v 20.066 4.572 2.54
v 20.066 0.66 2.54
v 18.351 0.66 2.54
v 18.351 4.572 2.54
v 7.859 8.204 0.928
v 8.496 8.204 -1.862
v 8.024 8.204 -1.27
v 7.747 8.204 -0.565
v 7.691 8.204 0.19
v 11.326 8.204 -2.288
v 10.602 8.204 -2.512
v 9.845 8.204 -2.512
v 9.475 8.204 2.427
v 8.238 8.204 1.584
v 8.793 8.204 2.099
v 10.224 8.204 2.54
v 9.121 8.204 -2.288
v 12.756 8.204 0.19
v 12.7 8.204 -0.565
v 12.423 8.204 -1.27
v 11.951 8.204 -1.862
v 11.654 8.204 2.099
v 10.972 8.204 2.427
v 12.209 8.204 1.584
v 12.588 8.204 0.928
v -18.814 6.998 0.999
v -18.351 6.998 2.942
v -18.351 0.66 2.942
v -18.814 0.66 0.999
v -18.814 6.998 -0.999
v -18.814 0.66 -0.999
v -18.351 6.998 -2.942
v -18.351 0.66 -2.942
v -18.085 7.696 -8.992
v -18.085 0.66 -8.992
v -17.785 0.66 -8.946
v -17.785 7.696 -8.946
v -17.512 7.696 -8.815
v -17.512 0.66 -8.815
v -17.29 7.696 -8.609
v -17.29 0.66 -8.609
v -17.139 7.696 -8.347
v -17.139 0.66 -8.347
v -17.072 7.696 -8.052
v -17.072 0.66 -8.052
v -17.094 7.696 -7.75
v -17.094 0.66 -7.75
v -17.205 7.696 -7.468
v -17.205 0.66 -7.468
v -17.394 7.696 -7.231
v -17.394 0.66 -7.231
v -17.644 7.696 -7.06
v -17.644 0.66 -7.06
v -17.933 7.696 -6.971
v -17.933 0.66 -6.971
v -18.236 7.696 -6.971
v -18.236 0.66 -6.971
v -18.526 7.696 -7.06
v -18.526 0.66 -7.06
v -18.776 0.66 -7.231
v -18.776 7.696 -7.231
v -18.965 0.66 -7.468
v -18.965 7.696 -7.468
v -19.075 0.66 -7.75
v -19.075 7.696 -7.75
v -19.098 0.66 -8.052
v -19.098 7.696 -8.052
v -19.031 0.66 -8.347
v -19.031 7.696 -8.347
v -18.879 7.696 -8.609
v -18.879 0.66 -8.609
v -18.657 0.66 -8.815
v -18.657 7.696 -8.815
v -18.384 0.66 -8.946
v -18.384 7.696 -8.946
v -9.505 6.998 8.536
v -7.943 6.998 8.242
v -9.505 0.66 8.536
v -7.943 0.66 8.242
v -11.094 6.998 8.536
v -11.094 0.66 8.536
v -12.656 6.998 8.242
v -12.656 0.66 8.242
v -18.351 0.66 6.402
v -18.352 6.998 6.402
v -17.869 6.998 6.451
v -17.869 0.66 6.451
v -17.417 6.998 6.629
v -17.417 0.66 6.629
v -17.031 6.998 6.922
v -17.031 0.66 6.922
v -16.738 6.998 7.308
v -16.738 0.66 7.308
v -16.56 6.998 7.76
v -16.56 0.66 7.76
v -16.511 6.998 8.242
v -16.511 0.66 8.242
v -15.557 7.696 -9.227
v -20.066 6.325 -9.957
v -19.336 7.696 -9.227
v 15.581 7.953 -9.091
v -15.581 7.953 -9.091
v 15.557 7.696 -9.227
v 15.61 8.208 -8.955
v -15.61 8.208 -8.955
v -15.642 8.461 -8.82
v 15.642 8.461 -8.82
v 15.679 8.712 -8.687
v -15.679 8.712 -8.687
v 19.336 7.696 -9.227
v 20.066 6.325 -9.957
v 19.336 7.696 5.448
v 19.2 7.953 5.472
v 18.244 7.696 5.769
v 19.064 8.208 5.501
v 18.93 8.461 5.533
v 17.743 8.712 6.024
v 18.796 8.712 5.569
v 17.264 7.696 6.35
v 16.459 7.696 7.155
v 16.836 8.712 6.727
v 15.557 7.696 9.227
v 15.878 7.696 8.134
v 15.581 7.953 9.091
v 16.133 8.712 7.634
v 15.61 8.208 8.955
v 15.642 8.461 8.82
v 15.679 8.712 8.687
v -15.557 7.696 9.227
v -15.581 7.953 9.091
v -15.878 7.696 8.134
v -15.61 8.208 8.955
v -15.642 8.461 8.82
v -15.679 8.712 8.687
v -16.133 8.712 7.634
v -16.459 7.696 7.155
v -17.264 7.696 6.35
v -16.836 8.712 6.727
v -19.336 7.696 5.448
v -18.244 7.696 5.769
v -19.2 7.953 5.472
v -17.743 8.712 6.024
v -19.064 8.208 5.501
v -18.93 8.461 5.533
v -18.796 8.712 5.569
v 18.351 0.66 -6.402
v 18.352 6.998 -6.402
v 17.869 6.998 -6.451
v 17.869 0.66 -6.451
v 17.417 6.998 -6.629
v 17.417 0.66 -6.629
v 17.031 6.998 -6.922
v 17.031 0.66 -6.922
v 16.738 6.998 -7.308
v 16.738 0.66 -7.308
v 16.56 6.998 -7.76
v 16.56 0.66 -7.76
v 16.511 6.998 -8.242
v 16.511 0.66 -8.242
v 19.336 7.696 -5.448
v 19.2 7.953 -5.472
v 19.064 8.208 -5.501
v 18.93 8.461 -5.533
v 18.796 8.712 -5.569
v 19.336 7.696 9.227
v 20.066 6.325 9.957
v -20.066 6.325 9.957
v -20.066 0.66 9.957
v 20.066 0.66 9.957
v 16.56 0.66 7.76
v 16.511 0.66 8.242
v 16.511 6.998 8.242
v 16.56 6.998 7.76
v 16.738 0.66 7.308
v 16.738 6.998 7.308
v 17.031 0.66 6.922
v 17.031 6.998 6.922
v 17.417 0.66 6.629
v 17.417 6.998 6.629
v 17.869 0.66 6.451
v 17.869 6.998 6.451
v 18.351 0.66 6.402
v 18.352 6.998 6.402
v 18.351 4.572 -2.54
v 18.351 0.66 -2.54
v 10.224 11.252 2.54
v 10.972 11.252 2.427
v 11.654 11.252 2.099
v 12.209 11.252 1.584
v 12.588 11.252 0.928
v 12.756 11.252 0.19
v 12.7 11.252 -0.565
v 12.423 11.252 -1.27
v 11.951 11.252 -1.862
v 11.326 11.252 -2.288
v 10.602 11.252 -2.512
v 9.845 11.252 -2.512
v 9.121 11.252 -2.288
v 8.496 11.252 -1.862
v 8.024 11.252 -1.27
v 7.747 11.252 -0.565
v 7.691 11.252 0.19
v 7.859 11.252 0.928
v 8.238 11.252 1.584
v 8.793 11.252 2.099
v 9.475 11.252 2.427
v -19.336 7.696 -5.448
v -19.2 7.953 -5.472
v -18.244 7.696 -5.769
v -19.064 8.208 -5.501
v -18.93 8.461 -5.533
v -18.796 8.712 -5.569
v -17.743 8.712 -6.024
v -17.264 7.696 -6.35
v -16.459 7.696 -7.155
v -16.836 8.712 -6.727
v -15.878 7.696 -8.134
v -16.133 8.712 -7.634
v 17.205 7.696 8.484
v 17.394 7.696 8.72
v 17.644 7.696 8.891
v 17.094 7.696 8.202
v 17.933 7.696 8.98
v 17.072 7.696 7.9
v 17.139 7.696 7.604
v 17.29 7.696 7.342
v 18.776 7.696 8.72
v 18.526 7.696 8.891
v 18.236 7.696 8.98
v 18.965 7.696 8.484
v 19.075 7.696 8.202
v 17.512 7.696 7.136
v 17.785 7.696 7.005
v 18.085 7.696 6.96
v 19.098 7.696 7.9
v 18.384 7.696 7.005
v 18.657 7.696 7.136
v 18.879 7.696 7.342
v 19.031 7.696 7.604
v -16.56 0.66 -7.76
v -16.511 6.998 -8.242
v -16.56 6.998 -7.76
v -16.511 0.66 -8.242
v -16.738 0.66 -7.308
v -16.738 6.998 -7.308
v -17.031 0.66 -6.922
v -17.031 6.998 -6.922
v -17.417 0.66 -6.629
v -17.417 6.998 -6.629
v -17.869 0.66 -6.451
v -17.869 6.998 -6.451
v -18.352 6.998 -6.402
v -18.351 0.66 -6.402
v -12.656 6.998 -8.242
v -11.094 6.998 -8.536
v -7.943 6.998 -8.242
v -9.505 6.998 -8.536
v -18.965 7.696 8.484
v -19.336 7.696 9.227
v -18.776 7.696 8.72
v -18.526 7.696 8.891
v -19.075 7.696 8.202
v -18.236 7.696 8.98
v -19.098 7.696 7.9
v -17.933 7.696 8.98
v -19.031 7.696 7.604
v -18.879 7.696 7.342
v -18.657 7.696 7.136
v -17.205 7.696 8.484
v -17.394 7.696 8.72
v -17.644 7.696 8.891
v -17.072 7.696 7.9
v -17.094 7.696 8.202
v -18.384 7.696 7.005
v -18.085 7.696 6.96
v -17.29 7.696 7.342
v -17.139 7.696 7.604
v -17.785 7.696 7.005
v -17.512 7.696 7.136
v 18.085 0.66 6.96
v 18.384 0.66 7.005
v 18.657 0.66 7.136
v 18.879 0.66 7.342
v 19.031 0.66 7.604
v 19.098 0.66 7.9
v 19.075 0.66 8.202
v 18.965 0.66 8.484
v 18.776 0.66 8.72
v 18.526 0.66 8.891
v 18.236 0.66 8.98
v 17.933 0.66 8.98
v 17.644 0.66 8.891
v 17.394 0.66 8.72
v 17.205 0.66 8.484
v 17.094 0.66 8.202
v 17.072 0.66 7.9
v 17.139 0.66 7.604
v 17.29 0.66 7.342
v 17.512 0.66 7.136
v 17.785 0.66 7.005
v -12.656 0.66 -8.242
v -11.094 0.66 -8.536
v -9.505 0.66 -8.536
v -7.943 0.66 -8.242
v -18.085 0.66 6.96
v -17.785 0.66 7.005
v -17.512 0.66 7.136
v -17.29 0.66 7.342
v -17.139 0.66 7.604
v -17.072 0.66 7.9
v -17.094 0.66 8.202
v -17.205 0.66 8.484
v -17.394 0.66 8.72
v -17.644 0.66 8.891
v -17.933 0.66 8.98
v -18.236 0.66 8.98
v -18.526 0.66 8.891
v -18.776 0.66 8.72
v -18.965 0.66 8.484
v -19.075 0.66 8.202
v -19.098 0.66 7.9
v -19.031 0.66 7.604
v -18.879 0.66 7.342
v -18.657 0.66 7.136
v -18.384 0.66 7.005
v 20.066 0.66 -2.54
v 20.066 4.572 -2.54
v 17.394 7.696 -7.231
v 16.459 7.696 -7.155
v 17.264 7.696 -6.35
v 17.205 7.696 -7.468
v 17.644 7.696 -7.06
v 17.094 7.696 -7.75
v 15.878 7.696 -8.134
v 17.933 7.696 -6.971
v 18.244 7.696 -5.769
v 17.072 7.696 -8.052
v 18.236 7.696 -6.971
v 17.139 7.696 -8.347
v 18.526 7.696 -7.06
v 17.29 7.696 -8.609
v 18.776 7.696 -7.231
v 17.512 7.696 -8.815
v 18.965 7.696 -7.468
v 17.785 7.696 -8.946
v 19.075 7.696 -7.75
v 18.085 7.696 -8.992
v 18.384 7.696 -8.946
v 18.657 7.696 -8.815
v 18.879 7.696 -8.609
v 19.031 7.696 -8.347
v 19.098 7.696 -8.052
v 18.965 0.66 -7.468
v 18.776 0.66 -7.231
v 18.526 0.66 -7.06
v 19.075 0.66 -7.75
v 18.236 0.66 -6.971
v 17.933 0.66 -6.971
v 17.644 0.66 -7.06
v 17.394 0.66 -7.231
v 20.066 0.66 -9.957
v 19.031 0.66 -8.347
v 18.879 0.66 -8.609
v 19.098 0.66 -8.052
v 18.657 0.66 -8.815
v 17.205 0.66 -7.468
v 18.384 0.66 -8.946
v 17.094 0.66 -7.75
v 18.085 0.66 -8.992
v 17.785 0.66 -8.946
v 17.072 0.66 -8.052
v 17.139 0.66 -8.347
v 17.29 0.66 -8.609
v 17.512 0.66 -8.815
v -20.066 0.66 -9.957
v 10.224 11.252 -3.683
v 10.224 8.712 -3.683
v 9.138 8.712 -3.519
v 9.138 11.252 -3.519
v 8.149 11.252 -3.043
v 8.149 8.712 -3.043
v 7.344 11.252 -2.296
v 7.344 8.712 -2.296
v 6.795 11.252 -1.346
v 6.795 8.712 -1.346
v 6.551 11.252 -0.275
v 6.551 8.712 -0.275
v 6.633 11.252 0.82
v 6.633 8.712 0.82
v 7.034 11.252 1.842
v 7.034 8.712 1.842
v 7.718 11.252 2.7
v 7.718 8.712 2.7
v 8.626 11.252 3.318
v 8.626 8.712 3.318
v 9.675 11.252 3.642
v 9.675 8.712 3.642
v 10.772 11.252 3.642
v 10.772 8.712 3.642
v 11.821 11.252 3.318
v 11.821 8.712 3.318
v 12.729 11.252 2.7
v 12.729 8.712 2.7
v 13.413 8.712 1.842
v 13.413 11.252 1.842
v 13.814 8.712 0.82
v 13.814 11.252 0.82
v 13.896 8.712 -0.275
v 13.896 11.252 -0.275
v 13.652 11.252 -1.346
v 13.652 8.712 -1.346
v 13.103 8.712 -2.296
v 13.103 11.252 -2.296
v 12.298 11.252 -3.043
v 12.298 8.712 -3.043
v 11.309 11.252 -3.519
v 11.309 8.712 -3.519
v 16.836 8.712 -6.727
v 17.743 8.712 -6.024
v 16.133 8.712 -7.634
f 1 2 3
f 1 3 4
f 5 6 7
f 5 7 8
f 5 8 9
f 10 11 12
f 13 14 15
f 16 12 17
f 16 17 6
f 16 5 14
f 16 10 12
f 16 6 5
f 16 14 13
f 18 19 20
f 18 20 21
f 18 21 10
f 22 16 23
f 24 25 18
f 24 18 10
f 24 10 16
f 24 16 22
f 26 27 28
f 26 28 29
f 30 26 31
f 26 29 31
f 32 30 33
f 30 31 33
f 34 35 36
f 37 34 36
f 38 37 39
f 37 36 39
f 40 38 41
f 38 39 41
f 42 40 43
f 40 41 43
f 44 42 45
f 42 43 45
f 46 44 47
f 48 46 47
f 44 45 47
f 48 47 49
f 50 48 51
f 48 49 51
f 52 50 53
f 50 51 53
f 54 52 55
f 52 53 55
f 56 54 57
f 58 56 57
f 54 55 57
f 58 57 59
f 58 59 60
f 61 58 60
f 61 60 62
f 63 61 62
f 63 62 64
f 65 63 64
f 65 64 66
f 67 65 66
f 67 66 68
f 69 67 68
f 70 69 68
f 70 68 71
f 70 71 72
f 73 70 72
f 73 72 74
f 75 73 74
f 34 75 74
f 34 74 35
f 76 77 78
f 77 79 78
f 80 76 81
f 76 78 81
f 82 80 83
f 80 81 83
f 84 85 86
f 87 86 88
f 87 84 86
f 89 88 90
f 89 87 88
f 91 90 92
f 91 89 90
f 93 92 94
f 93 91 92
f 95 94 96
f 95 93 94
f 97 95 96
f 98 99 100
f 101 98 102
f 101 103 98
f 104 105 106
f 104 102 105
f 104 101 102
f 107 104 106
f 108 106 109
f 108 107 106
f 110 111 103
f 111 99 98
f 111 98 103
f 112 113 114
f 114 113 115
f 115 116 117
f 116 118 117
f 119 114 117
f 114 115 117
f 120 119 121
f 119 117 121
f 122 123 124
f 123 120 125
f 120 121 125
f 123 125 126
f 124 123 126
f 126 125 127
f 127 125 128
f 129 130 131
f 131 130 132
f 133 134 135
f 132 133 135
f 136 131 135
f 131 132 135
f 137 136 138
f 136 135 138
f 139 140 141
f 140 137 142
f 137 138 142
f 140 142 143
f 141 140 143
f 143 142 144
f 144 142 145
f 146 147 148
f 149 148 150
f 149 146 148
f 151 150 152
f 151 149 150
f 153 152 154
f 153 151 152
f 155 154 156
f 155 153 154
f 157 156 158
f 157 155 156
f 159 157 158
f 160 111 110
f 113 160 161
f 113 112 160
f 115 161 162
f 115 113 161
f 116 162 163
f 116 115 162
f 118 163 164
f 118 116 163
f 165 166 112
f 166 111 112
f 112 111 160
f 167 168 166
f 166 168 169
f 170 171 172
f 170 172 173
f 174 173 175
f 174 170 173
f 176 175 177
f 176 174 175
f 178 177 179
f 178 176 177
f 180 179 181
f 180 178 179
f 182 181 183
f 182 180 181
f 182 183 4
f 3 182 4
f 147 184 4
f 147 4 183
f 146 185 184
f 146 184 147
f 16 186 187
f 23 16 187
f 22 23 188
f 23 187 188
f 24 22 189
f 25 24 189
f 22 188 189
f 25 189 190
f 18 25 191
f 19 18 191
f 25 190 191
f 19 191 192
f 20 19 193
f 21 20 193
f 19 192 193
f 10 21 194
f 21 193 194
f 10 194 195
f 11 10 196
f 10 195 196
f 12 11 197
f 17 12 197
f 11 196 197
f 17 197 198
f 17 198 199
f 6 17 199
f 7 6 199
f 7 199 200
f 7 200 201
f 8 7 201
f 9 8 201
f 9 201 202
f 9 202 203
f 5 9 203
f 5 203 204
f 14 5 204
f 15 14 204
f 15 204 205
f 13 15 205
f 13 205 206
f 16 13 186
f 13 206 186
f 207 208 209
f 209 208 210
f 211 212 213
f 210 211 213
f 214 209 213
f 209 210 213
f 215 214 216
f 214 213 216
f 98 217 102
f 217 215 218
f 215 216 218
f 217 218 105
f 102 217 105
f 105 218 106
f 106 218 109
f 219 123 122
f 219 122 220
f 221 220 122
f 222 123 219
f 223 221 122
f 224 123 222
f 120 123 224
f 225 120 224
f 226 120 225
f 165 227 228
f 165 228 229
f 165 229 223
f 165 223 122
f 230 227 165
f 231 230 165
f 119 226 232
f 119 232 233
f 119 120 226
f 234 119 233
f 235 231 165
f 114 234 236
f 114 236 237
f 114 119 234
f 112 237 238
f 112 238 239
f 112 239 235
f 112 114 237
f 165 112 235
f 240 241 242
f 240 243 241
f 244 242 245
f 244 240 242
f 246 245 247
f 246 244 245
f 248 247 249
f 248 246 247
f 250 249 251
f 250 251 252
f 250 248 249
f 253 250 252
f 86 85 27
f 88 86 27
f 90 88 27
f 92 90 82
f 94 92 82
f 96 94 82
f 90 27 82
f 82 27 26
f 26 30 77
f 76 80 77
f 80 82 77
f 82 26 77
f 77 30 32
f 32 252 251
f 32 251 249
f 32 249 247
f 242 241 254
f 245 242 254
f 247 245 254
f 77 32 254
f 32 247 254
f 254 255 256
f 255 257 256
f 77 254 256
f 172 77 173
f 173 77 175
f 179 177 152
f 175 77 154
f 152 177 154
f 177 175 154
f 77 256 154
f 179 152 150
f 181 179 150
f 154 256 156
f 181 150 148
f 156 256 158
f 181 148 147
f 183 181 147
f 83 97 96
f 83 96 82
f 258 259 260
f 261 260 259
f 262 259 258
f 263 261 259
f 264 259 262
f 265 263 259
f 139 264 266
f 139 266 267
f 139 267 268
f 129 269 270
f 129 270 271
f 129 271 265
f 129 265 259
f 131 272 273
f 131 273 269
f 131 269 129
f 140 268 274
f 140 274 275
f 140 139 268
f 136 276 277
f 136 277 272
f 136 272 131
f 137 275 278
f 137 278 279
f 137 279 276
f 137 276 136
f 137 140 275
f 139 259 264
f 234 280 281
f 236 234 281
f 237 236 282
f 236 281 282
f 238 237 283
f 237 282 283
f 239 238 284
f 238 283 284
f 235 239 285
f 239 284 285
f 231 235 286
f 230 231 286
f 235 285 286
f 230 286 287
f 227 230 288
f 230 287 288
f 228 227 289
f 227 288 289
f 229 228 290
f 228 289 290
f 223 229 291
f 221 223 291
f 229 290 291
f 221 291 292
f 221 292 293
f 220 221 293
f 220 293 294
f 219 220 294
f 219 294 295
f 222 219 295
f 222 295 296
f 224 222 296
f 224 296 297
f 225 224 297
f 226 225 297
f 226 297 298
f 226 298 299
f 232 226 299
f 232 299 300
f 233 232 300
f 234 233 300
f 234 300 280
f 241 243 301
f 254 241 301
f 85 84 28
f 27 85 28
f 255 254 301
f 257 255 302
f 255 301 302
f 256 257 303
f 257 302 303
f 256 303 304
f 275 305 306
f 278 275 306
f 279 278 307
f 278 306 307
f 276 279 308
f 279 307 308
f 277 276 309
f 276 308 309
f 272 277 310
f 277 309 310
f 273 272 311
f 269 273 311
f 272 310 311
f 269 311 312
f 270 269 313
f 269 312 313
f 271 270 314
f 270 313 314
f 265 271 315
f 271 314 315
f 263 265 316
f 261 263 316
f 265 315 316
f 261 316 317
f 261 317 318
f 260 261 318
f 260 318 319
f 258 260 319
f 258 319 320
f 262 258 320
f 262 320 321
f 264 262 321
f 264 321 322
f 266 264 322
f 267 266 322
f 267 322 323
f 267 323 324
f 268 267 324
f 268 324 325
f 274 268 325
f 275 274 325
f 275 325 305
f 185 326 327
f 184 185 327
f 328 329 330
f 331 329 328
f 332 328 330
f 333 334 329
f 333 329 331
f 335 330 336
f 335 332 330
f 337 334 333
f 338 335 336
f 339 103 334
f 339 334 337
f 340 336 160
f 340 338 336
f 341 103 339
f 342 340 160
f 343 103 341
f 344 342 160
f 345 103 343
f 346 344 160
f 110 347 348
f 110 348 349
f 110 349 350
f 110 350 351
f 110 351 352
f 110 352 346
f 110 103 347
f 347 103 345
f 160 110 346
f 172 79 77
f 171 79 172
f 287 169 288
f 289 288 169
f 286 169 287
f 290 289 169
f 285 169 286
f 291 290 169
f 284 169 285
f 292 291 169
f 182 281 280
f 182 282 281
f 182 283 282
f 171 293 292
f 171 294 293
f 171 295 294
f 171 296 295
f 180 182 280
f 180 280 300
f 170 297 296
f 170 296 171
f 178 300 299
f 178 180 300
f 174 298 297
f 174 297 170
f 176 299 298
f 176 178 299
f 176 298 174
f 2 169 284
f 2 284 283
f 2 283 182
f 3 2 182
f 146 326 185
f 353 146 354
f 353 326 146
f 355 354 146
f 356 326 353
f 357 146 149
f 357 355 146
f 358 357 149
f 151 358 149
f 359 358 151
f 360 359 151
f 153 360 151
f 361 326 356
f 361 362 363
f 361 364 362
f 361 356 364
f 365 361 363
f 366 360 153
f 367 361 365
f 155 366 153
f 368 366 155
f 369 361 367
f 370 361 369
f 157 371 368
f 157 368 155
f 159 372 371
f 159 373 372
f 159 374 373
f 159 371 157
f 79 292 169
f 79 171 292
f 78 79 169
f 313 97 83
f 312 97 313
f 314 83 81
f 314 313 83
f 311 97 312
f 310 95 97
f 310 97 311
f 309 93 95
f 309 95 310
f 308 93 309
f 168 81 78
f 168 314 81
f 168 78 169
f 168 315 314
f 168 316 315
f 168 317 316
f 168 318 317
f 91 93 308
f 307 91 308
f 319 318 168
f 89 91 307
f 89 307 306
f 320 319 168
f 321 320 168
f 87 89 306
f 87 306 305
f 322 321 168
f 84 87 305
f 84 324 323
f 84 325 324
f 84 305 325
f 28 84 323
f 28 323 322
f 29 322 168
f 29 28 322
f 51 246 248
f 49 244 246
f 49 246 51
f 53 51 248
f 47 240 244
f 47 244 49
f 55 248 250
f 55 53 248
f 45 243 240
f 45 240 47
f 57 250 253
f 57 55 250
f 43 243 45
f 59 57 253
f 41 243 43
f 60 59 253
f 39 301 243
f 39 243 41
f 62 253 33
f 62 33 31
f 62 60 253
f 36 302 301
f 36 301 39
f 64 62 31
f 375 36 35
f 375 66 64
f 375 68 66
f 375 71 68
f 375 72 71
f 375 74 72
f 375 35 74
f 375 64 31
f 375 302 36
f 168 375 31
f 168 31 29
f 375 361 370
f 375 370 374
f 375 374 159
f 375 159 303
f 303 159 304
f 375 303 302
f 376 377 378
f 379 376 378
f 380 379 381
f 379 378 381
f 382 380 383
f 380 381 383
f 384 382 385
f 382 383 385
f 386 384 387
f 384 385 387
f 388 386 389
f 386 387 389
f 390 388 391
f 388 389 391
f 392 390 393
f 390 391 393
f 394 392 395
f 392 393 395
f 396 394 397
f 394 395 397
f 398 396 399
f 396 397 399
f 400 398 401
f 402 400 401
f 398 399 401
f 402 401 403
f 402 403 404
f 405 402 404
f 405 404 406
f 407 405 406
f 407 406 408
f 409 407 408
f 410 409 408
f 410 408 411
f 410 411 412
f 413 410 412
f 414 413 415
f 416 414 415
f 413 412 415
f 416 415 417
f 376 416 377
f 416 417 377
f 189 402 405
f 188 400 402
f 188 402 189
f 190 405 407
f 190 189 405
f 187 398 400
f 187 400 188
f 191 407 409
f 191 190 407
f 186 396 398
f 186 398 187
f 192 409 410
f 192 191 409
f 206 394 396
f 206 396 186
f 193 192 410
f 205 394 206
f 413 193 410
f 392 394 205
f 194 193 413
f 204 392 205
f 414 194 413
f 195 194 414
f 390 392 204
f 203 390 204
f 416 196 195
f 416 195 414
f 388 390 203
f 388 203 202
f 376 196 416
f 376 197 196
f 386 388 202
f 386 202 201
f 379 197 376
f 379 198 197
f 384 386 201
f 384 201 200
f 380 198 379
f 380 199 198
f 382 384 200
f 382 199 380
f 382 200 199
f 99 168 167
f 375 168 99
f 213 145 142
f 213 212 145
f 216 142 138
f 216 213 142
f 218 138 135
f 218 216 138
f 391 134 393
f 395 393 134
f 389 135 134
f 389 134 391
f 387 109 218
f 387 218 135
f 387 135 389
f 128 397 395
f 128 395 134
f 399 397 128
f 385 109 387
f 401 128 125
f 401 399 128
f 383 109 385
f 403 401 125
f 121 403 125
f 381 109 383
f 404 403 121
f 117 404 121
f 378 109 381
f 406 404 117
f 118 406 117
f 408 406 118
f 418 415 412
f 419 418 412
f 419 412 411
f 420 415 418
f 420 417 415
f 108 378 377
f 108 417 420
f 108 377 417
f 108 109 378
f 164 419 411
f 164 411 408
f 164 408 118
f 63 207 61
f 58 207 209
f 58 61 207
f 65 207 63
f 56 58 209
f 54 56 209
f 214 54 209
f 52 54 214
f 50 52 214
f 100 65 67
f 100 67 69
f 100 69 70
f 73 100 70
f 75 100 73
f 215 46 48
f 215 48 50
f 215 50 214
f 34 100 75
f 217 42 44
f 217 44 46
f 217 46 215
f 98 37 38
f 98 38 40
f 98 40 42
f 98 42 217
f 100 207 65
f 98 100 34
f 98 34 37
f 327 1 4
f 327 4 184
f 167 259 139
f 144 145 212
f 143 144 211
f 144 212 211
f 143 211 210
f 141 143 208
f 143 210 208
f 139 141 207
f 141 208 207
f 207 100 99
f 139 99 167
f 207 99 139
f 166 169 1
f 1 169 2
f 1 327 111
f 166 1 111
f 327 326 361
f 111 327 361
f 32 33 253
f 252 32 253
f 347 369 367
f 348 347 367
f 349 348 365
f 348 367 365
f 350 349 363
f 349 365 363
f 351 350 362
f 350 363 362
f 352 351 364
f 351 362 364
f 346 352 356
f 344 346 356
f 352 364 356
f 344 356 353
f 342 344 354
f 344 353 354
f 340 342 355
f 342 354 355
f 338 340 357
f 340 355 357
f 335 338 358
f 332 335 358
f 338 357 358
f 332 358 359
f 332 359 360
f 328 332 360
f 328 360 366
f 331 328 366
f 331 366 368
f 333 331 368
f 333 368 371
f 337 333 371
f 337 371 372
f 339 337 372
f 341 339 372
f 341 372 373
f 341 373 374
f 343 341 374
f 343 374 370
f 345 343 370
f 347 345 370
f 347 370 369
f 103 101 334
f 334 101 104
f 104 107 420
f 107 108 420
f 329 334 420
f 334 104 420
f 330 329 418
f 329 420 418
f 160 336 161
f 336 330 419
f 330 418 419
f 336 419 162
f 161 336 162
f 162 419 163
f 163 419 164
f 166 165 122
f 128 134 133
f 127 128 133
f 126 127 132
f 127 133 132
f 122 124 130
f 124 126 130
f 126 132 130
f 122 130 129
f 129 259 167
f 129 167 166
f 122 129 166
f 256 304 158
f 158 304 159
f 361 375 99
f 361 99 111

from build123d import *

# Parameters (mm, degrees)
SKETCH1_W           = 40.132
SKETCH1_H           = 19.9136
BOSS_EXTRUDE1_DEPTH = 8.7122
SHELL1_T            = -1.7145
SKETCH3_R           = 3.683
BOSS_EXTRUDE2_DEPTH = 2.54
SKETCH4_R           = 2.54
CUT_EXTRUDE2_DEPTH  = 3.048
SKETCH8_R           = 1.778
BOSS_EXTRUDE5_DEPTH = 6.9977
SKETCH7_R           = 1.016
CUT_EXTRUDE5_DEPTH  = 8.7122
CHAMFER1_SIZE       = 2.3876
CHAMFER1_SIZE_2     = 1.27
SKETCH2_R           = 4.567425491
CUT_EXTRUDE6_DEPTH  = 1.016
SKETCH10_W          = 40.259
SKETCH10_H          = 19.9136
CUT_EXTRUDE7_DEPTH  = 0.6604
SKETCH11_W          = 5.08
SKETCH11_H          = 4.572
CUT_EXTRUDE8_DEPTH  = 1.7145
SKETCH12_R          = 8.5725
CUT_EXTRUDE9_DEPTH  = 6.9977


with BuildPart() as part:
    # Sketch1 → Boss-Extrude1 (new body)
    with BuildSketch(Plane(origin=(0, 0, 0), x_dir=(1, 0, 0), z_dir=(0, 1, 0))):
        Rectangle(SKETCH1_W, SKETCH1_H)
    extrude(amount=BOSS_EXTRUDE1_DEPTH)

    # Shell1
    shell1_openings = [part.faces().sort_by_distance(p)[0] for p in [
        (0, 0, 0),
    ]]
    offset(amount=SHELL1_T, openings=shell1_openings, kind=Kind.INTERSECTION)

    # Sketch3 → Boss-Extrude2 (add)
    with BuildSketch(Plane(origin=(0, 8.7122, 0), x_dir=(1, 0, 0), z_dir=(0, 1, 0))):
        with Locations(Location((10.2235, 0, 0), (0, 0, 90))):
            Circle(SKETCH3_R)
    extrude(amount=BOSS_EXTRUDE2_DEPTH)

    # Sketch4 → Cut-Extrude2 (cut)
    with BuildSketch(Plane(origin=(0, 11.2522, 0), x_dir=(1, 0, 0), z_dir=(0, 1, 0))):
        with Locations(Location((10.2235, 0, 0), (0, 0, 270))):
            Circle(SKETCH4_R)
    extrude(amount=-CUT_EXTRUDE2_DEPTH, mode=Mode.SUBTRACT)

    # Sketch8 → Boss-Extrude5 (add)
    with BuildSketch(Plane(origin=(0, 0, 0), x_dir=(-1, 0, 0), z_dir=(0, -1, 0))):
        with Locations((18.288, 8.1788)):
            Circle(SKETCH8_R)
        with Locations((-18.288, 8.1788)):
            Circle(SKETCH8_R)
        with Locations((18.288, -8.1788)):
            Circle(SKETCH8_R)
        with Locations((-18.288, -8.1788)):
            Circle(SKETCH8_R)
    extrude(amount=-BOSS_EXTRUDE5_DEPTH)

    # Sketch7 → Cut-Extrude5 (cut)
    with BuildSketch(Plane(origin=(0, 0, 0), x_dir=(-1, 0, 0), z_dir=(0, -1, 0))):
        with Locations(Location((18.0848, 7.9756, 0), (0, 0, 90))):
            Circle(SKETCH7_R)
        with Locations(Location((-18.0848, 7.9756, 0), (0, 0, 90))):
            Circle(SKETCH7_R)
        with Locations(Location((18.0848, -7.9756, 0), (0, 0, 90))):
            Circle(SKETCH7_R)
        with Locations(Location((-18.0848, -7.9756, 0), (0, 0, 90))):
            Circle(SKETCH7_R)
    extrude(amount=-CUT_EXTRUDE5_DEPTH, mode=Mode.SUBTRACT)

    # Chamfer1
    # the kernel refuses this chamfer: 2.3876, 1.27 mm, written as the material it takes off along each edge
    with BuildSketch(Plane(origin=(20.066, 8.7122, 16.137611711), x_dir=(0.018140787758026848, -0.9998354423701522, 0), z_dir=(0, 0, -1))) as chamfer1_piece_1:
        Polygon((CHAMFER1_SIZE * 0.99983544237, CHAMFER1_SIZE * 0.018140787758), (-CHAMFER1_SIZE_2 * 0.018140787758, CHAMFER1_SIZE_2 * 0.99983544237), (0, 0), align=None)
    extrude(amount=32.275223423, mode=Mode.SUBTRACT)
    with BuildSketch(Plane(origin=(26.246811711, 8.7122, -9.9568), x_dir=(0, -0.9998354423701524, -0.01814078775802685), z_dir=(-1, 0, 0))) as chamfer1_piece_2:
        Polygon((CHAMFER1_SIZE * 0.99983544237, CHAMFER1_SIZE * 0.018140787758), (-CHAMFER1_SIZE_2 * 0.018140787758, CHAMFER1_SIZE_2 * 0.99983544237), (0, 0), align=None)
    extrude(amount=52.493623423, mode=Mode.SUBTRACT)
    with BuildSketch(Plane(origin=(-20.066, 8.7122, -16.137611711), x_dir=(0.9979501613334688, 0.06399590216962081, 0), z_dir=(0, 0, 1))) as chamfer1_piece_3:
        Polygon((CHAMFER1_SIZE_2 * 0.997950161333, -CHAMFER1_SIZE_2 * 0.0639959021696), (-CHAMFER1_SIZE * 0.0639959021696, -CHAMFER1_SIZE * 0.997950161333), (0, 0), align=None)
    extrude(amount=32.275223423, mode=Mode.SUBTRACT)
    with BuildSketch(Plane(origin=(-26.246811711, 8.7122, 9.9568), x_dir=(0, 0.06399590216962081, -0.9979501613334687), z_dir=(1, 0, 0))) as chamfer1_piece_4:
        Polygon((CHAMFER1_SIZE_2 * 0.997950161333, -CHAMFER1_SIZE_2 * 0.0639959021696), (-CHAMFER1_SIZE * 0.0639959021696, -CHAMFER1_SIZE * 0.997950161333), (0, 0), align=None)
    extrude(amount=52.493623423, mode=Mode.SUBTRACT)

    # Sketch2 → Cut-Extrude6 (cut)
    with BuildSketch(Plane(origin=(0, 8.7122, 0), x_dir=(1, 0, 0), z_dir=(0, 1, 0))):
        with Locations((20.066, 9.9568)):
            Circle(SKETCH2_R)
        with Locations((-20.066, 9.9568)):
            Circle(SKETCH2_R)
        with Locations((-20.066, -9.9568)):
            Circle(SKETCH2_R)
        with Locations((20.066, -9.9568)):
            Circle(SKETCH2_R)
    extrude(amount=-CUT_EXTRUDE6_DEPTH, mode=Mode.SUBTRACT)

    # Sketch10 → Cut-Extrude7 (cut)
    with BuildSketch(Plane(origin=(0, 0, 0), x_dir=(-1, 0, 0), z_dir=(0, -1, 0))):
        with Locations((0.0635, 0)):
            Rectangle(SKETCH10_W, SKETCH10_H)
    extrude(amount=-CUT_EXTRUDE7_DEPTH, mode=Mode.SUBTRACT)

    # Sketch11 → Cut-Extrude8 (cut)
    with BuildSketch(Plane(origin=(20.066, 0, 0), x_dir=(0, 0, -1), z_dir=(1, 0, 0))):
        with Locations((0, 2.286)):
            Rectangle(SKETCH11_W, SKETCH11_H)
    extrude(amount=-CUT_EXTRUDE8_DEPTH, mode=Mode.SUBTRACT)

    # Sketch12 → Cut-Extrude9 (cut)
    with BuildSketch(Plane(origin=(0, 0, 0), x_dir=(-1, 0, 0), z_dir=(0, -1, 0))):
        with Locations((10.2997, 0)):
            Circle(SKETCH12_R)
    extrude(amount=-CUT_EXTRUDE9_DEPTH, mode=Mode.SUBTRACT)


solid = part.part
